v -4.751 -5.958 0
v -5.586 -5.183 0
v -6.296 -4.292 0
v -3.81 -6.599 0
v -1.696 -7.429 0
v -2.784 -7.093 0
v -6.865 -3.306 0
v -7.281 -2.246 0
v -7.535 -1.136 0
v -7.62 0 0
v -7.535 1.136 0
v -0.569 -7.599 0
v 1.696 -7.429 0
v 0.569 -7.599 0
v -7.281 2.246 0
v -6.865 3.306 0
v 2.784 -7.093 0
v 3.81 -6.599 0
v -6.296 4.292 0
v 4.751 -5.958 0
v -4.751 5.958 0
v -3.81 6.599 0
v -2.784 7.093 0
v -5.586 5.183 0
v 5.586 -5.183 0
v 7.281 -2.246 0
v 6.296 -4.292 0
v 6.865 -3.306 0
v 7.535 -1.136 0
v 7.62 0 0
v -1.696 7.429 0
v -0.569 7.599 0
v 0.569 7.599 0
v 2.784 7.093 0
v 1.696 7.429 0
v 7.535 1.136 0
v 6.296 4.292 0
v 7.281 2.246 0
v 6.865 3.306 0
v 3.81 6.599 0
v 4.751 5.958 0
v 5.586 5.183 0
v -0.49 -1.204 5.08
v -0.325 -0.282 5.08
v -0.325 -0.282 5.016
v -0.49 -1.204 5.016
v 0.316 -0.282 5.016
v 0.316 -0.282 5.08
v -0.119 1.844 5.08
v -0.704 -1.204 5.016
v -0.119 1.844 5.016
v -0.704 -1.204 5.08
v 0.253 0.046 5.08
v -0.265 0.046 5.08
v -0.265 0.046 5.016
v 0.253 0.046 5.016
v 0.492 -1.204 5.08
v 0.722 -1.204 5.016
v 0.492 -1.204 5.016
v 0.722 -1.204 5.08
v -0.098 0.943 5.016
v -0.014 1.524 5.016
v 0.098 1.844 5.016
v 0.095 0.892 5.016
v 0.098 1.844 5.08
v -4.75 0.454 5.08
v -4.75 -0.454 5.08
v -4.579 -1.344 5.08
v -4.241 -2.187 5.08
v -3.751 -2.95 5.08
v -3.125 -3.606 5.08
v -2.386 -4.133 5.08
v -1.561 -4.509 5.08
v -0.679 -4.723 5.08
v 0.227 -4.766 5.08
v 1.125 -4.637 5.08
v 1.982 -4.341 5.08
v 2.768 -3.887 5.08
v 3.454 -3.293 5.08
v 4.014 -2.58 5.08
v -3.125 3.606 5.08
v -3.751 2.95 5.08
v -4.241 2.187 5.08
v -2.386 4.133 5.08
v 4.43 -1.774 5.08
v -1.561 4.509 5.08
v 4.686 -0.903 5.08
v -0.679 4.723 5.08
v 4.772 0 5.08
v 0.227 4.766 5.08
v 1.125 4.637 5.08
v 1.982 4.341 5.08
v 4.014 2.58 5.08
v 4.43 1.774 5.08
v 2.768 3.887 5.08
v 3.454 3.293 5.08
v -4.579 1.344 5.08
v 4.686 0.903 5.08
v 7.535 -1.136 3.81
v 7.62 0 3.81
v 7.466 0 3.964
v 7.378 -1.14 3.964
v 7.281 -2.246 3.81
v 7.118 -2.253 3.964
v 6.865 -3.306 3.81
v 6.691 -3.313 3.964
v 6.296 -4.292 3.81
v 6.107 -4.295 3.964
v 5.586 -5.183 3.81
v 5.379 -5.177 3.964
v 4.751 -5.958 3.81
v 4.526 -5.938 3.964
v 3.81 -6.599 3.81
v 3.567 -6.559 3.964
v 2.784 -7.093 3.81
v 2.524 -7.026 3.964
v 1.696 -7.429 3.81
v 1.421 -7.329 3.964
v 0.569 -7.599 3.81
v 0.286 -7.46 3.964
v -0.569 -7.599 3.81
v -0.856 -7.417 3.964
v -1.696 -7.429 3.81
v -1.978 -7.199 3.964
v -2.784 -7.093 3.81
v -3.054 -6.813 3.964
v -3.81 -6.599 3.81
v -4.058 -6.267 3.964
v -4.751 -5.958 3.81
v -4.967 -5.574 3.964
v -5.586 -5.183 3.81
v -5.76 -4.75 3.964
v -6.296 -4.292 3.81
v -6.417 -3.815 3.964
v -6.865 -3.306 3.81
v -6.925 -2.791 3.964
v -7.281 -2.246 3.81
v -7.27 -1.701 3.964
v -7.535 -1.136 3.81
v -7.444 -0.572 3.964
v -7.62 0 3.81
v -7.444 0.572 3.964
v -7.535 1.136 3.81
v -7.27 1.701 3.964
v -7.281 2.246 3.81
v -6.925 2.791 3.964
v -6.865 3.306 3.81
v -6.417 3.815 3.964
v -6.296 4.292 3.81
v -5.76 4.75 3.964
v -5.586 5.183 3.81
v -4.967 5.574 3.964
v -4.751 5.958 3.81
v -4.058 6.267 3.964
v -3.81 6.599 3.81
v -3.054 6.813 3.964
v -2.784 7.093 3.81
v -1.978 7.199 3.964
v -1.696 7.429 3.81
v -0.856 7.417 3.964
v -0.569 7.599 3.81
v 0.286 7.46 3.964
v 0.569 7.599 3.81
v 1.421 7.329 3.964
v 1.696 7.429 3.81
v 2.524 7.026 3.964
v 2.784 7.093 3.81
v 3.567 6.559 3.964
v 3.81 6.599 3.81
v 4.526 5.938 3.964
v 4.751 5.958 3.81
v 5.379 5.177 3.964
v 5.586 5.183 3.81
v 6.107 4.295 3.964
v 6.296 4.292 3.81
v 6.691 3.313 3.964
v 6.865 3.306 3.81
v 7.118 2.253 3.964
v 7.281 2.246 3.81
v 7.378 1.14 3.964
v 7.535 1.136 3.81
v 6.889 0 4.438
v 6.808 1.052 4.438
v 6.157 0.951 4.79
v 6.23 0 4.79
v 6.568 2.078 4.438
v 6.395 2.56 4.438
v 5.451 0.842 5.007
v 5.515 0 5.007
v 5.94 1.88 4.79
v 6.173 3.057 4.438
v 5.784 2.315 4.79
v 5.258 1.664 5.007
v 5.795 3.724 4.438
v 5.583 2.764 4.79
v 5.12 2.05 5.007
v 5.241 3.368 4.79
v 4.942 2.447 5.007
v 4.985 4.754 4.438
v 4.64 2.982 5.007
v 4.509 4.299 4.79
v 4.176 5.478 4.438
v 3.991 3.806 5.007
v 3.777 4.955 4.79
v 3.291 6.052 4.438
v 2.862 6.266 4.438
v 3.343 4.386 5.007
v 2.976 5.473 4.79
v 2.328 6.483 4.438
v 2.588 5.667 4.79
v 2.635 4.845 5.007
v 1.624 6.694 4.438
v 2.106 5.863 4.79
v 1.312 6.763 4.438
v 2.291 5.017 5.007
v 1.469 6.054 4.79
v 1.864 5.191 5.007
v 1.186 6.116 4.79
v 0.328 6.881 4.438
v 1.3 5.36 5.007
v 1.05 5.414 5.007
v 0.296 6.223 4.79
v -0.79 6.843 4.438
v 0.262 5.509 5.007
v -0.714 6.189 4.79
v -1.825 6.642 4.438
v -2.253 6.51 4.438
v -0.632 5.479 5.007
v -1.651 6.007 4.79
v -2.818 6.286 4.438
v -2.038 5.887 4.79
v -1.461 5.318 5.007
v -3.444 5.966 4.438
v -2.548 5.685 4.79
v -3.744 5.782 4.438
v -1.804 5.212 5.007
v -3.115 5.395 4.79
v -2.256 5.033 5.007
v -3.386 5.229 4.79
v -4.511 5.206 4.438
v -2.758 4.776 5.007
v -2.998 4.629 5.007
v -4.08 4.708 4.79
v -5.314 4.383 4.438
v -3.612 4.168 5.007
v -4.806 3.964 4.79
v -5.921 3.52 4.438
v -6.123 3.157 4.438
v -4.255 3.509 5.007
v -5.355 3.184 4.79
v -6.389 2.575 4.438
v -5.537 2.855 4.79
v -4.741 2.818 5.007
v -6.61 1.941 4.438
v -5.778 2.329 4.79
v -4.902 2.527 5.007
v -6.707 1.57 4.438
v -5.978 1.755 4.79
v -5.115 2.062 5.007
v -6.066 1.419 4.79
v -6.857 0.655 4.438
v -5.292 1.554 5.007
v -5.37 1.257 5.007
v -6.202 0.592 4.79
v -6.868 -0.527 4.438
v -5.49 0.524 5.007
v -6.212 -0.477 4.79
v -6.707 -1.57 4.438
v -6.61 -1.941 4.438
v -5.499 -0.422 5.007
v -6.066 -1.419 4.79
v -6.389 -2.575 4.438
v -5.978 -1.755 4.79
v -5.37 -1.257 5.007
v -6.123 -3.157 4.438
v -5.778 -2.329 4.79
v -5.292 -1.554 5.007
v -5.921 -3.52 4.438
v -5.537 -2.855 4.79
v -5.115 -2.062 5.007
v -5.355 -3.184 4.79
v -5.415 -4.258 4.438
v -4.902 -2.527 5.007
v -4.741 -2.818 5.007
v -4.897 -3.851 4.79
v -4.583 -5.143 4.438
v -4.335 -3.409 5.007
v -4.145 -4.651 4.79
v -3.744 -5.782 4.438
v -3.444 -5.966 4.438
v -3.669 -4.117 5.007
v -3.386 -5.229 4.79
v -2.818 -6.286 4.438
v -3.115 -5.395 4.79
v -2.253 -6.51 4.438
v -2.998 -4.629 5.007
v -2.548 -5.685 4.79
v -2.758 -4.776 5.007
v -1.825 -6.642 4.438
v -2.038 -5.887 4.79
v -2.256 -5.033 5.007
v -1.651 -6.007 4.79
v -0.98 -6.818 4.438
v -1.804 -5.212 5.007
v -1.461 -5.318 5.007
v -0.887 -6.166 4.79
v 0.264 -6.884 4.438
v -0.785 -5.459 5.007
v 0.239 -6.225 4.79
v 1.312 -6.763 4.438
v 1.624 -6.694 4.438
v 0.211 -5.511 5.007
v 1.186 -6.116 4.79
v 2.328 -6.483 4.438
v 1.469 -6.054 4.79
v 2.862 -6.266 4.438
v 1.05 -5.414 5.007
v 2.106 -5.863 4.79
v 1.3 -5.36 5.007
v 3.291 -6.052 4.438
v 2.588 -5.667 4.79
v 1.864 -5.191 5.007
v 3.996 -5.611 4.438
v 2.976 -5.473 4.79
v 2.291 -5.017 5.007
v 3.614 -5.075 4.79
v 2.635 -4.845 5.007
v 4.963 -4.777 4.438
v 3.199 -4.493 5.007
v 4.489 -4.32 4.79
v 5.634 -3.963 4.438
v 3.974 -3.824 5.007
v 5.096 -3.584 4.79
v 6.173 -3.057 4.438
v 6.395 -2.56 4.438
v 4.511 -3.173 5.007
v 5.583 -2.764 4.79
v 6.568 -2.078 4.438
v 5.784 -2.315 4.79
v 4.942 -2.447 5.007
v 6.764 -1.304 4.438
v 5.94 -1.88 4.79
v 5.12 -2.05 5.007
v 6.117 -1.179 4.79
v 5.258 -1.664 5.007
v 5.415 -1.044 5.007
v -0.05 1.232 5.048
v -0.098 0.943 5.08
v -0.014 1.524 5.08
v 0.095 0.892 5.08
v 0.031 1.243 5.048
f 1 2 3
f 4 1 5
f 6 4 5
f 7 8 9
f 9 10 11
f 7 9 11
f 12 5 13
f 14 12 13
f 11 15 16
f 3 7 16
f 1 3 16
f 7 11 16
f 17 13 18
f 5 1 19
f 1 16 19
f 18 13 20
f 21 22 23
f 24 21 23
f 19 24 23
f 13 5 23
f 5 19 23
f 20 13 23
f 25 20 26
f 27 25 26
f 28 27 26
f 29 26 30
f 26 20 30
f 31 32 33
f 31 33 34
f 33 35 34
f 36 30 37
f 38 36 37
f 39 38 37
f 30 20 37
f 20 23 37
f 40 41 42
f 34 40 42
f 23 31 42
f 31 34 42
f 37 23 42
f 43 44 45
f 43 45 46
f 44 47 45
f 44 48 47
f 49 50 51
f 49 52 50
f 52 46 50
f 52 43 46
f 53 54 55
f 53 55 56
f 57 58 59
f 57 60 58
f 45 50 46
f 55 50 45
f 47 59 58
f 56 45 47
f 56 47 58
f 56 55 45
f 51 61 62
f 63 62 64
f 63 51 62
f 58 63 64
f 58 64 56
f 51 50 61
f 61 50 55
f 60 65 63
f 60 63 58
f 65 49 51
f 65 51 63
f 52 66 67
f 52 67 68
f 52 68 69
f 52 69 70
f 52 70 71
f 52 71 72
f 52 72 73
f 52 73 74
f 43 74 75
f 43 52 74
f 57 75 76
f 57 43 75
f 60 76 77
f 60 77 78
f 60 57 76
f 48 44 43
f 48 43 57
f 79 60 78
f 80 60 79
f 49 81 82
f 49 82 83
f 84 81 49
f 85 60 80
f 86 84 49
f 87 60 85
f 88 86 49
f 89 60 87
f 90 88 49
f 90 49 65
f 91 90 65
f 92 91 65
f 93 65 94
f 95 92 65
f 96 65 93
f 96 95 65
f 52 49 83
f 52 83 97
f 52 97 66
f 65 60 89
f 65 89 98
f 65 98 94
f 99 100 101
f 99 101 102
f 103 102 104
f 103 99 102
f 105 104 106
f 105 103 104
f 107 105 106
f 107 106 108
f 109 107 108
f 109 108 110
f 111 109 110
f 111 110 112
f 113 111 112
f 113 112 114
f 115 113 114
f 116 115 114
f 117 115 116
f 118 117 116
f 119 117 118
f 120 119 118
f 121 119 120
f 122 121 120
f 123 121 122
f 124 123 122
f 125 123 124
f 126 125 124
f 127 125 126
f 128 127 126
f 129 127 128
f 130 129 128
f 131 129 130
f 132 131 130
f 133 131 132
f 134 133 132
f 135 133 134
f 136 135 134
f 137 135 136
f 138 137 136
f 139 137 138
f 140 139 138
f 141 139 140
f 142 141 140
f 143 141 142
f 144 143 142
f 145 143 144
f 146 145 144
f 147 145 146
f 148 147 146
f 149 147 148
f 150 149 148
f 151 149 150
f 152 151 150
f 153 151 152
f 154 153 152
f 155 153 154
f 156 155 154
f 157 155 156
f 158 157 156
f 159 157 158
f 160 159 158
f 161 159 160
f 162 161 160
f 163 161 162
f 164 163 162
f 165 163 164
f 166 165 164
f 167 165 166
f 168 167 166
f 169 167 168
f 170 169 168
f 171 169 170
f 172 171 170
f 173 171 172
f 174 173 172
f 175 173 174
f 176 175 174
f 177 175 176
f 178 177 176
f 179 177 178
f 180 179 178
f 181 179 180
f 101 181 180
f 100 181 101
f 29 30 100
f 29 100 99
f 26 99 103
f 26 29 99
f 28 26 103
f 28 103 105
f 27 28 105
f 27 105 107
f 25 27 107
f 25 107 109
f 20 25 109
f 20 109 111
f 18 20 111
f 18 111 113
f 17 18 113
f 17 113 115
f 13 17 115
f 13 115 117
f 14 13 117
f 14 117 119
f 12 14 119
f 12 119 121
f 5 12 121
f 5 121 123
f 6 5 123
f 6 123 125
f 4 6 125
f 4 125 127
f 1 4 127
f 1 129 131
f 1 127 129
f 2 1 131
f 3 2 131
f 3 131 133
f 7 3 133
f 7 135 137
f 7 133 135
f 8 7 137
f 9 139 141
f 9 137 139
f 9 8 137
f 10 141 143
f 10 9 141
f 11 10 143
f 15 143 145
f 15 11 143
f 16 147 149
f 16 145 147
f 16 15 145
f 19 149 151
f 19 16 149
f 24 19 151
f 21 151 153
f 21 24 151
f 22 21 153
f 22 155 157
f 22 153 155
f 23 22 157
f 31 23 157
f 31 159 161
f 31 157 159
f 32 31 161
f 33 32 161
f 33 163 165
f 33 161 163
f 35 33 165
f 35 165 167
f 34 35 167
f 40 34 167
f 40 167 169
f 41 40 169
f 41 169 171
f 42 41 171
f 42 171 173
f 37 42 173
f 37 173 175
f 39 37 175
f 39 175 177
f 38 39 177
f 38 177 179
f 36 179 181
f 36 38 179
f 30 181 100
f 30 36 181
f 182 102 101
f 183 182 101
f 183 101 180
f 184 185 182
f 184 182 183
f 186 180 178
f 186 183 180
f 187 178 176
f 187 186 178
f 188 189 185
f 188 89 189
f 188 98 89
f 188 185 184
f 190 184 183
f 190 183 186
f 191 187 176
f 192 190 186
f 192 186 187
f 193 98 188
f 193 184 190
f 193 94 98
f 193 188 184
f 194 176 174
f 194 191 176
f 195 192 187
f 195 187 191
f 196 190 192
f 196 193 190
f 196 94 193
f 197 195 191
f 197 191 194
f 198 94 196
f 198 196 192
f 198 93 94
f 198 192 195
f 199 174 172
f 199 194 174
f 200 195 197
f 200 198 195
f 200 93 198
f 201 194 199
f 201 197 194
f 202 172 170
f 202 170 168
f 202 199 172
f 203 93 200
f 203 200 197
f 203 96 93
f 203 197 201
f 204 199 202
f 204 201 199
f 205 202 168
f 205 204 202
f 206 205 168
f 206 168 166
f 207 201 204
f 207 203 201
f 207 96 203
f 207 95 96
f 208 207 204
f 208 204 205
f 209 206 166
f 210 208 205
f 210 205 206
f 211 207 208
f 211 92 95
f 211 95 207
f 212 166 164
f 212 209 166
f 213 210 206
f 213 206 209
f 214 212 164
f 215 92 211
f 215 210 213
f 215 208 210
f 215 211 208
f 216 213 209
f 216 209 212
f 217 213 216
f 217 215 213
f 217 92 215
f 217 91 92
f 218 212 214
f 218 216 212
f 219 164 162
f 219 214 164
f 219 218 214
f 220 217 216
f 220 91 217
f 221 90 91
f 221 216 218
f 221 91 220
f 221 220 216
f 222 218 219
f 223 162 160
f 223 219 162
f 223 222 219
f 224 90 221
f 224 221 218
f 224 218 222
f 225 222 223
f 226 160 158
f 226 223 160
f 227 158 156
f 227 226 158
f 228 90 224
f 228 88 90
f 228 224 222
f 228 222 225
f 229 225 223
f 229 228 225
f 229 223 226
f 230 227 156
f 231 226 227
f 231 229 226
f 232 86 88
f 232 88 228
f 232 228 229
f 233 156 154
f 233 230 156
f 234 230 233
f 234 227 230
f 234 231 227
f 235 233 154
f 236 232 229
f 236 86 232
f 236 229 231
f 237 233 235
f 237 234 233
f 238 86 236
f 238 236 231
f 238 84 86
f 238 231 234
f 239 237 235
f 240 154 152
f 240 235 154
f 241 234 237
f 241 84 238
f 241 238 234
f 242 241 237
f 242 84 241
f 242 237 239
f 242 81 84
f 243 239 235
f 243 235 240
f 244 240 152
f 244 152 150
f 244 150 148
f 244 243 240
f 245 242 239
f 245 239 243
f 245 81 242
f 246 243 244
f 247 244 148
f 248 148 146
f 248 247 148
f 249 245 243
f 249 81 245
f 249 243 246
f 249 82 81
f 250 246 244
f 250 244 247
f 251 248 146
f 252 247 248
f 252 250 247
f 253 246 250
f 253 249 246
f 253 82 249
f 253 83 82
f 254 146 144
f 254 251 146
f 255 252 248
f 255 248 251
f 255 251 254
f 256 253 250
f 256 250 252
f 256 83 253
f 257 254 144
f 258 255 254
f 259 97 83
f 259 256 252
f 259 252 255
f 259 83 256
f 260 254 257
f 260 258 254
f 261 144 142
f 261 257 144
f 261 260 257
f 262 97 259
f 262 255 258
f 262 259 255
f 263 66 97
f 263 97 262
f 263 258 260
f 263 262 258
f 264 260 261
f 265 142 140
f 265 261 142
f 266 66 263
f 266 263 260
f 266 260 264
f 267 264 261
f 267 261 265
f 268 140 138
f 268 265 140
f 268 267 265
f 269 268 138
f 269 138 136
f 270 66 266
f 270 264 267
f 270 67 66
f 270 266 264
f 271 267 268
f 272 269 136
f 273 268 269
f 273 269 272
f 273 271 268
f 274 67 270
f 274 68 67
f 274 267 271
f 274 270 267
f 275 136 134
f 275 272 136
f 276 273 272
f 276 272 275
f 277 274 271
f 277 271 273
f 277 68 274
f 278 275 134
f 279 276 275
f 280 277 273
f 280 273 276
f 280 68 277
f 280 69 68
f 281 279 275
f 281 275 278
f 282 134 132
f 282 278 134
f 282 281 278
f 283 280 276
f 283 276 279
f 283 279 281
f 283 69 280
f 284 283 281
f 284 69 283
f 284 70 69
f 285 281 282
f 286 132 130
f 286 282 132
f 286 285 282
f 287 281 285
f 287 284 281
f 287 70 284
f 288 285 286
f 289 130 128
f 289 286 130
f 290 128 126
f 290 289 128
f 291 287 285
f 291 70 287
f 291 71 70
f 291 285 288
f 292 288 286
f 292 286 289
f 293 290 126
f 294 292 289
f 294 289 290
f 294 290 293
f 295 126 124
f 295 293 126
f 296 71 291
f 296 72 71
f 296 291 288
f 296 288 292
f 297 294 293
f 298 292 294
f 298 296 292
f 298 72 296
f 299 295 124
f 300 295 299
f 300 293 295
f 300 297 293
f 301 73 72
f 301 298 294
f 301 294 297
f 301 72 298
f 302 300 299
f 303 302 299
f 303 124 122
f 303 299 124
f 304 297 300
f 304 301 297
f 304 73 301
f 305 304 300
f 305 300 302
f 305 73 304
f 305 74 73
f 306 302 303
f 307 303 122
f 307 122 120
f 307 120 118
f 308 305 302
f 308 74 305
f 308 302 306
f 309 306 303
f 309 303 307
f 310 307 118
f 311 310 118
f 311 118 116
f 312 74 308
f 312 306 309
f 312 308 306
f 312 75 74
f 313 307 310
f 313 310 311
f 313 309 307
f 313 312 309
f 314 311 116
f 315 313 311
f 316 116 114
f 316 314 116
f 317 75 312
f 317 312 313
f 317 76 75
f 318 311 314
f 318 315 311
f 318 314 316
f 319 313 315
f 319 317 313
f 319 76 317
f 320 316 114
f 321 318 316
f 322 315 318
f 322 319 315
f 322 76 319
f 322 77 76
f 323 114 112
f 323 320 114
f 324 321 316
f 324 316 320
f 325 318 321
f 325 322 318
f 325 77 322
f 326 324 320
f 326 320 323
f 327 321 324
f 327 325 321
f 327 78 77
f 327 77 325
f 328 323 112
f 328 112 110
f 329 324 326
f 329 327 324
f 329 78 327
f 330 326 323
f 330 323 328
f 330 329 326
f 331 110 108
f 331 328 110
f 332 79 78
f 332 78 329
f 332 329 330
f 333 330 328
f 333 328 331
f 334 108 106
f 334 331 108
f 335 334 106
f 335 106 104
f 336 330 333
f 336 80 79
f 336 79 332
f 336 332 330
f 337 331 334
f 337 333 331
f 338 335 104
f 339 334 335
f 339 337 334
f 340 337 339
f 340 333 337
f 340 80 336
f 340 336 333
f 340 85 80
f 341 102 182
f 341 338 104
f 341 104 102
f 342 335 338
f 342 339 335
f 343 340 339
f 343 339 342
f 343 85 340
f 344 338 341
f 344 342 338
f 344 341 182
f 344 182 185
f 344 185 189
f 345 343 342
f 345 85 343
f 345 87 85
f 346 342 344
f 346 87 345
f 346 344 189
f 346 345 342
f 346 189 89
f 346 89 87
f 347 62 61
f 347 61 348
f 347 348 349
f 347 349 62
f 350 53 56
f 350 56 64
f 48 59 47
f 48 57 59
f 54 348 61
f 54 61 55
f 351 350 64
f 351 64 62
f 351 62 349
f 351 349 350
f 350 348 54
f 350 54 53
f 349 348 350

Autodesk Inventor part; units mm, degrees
ref_plane "YZ Plane" through (0, 0, 0) normal (1, 0, 0) x (0, 1, 0)
ref_plane "XZ Plane" through (0, 0, 0) normal (0, 1, 0) x (-1, 0, 0)
ref_plane "XY Plane" through (0, 0, 0) normal (0, 0, 1) x (1, 0, 0)
sketch "Sketch1" plane through (0, 0, 0) normal (0, 0, 1) x (1, 0, 0)
  circle A0 centre (0, 0) radius 7.62
  dimension "d0" = 15.24
extrude "Extrusion1" add sketch "Sketch1" along normal blind 5.08
chamfer "Chamfer1" distance 1.27 angle 45 1 edges at (-7.62, 0, 5.08)
fillet "Fillet1" radius 3.81 1 edges at (-6.35, 0, 5.08)
sketch "Sketch2" plane through (0, 0, 5.08) normal (0, 0, 1) x (1, 0, 0)
  line L0 (-0.7017, 1.8442) -> (0.7248, 1.8442) construction
  line L1 (0.7248, 1.8442) -> (0.7248, -1.2038) construction
  line L2 (0.7248, -1.2038) -> (-0.7017, -1.2038) construction
  line L3 (-0.7017, -1.2038) -> (-0.7017, 1.8442) construction
  line L4 (-0.704, -1.2038) -> (-0.1186, 1.8442)
  line L5 (-0.1186, 1.8442) -> (0.0975, 1.8442)
  line L6 (0.0975, 1.8442) -> (0.7224, -1.2038)
  line L7 (0.7224, -1.2038) -> (0.4924, -1.2038)
  line L8 (0.4924, -1.2038) -> (0.3159, -0.2815)
  line L9 (0.3159, -0.2815) -> (-0.3253, -0.2815)
  line L10 (-0.3253, -0.2815) -> (-0.4903, -1.2038)
  line L11 (-0.4903, -1.2038) -> (-0.704, -1.2038)
  line L12 (-0.2649, 0.0461) -> (0.2531, 0.0461)
  line L13 (0.2531, 0.0461) -> (0.0952, 0.8917)
  spline S0 degree 2 poles (0.0952, 0.8917) (0.0208, 1.2774) (-0.014, 1.5236) knots 0 0 0 1 1 1
  spline S1 degree 2 poles (-0.014, 1.5236) (-0.0442, 1.2309) (-0.0976, 0.9428) knots 0 0 0 1 1 1
  line L14 (-0.0976, 0.9428) -> (-0.2649, 0.0461)
extrude "Extrusion2" cut sketch "Sketch2" against normal blind 0.0635
properties part number "A Button"
